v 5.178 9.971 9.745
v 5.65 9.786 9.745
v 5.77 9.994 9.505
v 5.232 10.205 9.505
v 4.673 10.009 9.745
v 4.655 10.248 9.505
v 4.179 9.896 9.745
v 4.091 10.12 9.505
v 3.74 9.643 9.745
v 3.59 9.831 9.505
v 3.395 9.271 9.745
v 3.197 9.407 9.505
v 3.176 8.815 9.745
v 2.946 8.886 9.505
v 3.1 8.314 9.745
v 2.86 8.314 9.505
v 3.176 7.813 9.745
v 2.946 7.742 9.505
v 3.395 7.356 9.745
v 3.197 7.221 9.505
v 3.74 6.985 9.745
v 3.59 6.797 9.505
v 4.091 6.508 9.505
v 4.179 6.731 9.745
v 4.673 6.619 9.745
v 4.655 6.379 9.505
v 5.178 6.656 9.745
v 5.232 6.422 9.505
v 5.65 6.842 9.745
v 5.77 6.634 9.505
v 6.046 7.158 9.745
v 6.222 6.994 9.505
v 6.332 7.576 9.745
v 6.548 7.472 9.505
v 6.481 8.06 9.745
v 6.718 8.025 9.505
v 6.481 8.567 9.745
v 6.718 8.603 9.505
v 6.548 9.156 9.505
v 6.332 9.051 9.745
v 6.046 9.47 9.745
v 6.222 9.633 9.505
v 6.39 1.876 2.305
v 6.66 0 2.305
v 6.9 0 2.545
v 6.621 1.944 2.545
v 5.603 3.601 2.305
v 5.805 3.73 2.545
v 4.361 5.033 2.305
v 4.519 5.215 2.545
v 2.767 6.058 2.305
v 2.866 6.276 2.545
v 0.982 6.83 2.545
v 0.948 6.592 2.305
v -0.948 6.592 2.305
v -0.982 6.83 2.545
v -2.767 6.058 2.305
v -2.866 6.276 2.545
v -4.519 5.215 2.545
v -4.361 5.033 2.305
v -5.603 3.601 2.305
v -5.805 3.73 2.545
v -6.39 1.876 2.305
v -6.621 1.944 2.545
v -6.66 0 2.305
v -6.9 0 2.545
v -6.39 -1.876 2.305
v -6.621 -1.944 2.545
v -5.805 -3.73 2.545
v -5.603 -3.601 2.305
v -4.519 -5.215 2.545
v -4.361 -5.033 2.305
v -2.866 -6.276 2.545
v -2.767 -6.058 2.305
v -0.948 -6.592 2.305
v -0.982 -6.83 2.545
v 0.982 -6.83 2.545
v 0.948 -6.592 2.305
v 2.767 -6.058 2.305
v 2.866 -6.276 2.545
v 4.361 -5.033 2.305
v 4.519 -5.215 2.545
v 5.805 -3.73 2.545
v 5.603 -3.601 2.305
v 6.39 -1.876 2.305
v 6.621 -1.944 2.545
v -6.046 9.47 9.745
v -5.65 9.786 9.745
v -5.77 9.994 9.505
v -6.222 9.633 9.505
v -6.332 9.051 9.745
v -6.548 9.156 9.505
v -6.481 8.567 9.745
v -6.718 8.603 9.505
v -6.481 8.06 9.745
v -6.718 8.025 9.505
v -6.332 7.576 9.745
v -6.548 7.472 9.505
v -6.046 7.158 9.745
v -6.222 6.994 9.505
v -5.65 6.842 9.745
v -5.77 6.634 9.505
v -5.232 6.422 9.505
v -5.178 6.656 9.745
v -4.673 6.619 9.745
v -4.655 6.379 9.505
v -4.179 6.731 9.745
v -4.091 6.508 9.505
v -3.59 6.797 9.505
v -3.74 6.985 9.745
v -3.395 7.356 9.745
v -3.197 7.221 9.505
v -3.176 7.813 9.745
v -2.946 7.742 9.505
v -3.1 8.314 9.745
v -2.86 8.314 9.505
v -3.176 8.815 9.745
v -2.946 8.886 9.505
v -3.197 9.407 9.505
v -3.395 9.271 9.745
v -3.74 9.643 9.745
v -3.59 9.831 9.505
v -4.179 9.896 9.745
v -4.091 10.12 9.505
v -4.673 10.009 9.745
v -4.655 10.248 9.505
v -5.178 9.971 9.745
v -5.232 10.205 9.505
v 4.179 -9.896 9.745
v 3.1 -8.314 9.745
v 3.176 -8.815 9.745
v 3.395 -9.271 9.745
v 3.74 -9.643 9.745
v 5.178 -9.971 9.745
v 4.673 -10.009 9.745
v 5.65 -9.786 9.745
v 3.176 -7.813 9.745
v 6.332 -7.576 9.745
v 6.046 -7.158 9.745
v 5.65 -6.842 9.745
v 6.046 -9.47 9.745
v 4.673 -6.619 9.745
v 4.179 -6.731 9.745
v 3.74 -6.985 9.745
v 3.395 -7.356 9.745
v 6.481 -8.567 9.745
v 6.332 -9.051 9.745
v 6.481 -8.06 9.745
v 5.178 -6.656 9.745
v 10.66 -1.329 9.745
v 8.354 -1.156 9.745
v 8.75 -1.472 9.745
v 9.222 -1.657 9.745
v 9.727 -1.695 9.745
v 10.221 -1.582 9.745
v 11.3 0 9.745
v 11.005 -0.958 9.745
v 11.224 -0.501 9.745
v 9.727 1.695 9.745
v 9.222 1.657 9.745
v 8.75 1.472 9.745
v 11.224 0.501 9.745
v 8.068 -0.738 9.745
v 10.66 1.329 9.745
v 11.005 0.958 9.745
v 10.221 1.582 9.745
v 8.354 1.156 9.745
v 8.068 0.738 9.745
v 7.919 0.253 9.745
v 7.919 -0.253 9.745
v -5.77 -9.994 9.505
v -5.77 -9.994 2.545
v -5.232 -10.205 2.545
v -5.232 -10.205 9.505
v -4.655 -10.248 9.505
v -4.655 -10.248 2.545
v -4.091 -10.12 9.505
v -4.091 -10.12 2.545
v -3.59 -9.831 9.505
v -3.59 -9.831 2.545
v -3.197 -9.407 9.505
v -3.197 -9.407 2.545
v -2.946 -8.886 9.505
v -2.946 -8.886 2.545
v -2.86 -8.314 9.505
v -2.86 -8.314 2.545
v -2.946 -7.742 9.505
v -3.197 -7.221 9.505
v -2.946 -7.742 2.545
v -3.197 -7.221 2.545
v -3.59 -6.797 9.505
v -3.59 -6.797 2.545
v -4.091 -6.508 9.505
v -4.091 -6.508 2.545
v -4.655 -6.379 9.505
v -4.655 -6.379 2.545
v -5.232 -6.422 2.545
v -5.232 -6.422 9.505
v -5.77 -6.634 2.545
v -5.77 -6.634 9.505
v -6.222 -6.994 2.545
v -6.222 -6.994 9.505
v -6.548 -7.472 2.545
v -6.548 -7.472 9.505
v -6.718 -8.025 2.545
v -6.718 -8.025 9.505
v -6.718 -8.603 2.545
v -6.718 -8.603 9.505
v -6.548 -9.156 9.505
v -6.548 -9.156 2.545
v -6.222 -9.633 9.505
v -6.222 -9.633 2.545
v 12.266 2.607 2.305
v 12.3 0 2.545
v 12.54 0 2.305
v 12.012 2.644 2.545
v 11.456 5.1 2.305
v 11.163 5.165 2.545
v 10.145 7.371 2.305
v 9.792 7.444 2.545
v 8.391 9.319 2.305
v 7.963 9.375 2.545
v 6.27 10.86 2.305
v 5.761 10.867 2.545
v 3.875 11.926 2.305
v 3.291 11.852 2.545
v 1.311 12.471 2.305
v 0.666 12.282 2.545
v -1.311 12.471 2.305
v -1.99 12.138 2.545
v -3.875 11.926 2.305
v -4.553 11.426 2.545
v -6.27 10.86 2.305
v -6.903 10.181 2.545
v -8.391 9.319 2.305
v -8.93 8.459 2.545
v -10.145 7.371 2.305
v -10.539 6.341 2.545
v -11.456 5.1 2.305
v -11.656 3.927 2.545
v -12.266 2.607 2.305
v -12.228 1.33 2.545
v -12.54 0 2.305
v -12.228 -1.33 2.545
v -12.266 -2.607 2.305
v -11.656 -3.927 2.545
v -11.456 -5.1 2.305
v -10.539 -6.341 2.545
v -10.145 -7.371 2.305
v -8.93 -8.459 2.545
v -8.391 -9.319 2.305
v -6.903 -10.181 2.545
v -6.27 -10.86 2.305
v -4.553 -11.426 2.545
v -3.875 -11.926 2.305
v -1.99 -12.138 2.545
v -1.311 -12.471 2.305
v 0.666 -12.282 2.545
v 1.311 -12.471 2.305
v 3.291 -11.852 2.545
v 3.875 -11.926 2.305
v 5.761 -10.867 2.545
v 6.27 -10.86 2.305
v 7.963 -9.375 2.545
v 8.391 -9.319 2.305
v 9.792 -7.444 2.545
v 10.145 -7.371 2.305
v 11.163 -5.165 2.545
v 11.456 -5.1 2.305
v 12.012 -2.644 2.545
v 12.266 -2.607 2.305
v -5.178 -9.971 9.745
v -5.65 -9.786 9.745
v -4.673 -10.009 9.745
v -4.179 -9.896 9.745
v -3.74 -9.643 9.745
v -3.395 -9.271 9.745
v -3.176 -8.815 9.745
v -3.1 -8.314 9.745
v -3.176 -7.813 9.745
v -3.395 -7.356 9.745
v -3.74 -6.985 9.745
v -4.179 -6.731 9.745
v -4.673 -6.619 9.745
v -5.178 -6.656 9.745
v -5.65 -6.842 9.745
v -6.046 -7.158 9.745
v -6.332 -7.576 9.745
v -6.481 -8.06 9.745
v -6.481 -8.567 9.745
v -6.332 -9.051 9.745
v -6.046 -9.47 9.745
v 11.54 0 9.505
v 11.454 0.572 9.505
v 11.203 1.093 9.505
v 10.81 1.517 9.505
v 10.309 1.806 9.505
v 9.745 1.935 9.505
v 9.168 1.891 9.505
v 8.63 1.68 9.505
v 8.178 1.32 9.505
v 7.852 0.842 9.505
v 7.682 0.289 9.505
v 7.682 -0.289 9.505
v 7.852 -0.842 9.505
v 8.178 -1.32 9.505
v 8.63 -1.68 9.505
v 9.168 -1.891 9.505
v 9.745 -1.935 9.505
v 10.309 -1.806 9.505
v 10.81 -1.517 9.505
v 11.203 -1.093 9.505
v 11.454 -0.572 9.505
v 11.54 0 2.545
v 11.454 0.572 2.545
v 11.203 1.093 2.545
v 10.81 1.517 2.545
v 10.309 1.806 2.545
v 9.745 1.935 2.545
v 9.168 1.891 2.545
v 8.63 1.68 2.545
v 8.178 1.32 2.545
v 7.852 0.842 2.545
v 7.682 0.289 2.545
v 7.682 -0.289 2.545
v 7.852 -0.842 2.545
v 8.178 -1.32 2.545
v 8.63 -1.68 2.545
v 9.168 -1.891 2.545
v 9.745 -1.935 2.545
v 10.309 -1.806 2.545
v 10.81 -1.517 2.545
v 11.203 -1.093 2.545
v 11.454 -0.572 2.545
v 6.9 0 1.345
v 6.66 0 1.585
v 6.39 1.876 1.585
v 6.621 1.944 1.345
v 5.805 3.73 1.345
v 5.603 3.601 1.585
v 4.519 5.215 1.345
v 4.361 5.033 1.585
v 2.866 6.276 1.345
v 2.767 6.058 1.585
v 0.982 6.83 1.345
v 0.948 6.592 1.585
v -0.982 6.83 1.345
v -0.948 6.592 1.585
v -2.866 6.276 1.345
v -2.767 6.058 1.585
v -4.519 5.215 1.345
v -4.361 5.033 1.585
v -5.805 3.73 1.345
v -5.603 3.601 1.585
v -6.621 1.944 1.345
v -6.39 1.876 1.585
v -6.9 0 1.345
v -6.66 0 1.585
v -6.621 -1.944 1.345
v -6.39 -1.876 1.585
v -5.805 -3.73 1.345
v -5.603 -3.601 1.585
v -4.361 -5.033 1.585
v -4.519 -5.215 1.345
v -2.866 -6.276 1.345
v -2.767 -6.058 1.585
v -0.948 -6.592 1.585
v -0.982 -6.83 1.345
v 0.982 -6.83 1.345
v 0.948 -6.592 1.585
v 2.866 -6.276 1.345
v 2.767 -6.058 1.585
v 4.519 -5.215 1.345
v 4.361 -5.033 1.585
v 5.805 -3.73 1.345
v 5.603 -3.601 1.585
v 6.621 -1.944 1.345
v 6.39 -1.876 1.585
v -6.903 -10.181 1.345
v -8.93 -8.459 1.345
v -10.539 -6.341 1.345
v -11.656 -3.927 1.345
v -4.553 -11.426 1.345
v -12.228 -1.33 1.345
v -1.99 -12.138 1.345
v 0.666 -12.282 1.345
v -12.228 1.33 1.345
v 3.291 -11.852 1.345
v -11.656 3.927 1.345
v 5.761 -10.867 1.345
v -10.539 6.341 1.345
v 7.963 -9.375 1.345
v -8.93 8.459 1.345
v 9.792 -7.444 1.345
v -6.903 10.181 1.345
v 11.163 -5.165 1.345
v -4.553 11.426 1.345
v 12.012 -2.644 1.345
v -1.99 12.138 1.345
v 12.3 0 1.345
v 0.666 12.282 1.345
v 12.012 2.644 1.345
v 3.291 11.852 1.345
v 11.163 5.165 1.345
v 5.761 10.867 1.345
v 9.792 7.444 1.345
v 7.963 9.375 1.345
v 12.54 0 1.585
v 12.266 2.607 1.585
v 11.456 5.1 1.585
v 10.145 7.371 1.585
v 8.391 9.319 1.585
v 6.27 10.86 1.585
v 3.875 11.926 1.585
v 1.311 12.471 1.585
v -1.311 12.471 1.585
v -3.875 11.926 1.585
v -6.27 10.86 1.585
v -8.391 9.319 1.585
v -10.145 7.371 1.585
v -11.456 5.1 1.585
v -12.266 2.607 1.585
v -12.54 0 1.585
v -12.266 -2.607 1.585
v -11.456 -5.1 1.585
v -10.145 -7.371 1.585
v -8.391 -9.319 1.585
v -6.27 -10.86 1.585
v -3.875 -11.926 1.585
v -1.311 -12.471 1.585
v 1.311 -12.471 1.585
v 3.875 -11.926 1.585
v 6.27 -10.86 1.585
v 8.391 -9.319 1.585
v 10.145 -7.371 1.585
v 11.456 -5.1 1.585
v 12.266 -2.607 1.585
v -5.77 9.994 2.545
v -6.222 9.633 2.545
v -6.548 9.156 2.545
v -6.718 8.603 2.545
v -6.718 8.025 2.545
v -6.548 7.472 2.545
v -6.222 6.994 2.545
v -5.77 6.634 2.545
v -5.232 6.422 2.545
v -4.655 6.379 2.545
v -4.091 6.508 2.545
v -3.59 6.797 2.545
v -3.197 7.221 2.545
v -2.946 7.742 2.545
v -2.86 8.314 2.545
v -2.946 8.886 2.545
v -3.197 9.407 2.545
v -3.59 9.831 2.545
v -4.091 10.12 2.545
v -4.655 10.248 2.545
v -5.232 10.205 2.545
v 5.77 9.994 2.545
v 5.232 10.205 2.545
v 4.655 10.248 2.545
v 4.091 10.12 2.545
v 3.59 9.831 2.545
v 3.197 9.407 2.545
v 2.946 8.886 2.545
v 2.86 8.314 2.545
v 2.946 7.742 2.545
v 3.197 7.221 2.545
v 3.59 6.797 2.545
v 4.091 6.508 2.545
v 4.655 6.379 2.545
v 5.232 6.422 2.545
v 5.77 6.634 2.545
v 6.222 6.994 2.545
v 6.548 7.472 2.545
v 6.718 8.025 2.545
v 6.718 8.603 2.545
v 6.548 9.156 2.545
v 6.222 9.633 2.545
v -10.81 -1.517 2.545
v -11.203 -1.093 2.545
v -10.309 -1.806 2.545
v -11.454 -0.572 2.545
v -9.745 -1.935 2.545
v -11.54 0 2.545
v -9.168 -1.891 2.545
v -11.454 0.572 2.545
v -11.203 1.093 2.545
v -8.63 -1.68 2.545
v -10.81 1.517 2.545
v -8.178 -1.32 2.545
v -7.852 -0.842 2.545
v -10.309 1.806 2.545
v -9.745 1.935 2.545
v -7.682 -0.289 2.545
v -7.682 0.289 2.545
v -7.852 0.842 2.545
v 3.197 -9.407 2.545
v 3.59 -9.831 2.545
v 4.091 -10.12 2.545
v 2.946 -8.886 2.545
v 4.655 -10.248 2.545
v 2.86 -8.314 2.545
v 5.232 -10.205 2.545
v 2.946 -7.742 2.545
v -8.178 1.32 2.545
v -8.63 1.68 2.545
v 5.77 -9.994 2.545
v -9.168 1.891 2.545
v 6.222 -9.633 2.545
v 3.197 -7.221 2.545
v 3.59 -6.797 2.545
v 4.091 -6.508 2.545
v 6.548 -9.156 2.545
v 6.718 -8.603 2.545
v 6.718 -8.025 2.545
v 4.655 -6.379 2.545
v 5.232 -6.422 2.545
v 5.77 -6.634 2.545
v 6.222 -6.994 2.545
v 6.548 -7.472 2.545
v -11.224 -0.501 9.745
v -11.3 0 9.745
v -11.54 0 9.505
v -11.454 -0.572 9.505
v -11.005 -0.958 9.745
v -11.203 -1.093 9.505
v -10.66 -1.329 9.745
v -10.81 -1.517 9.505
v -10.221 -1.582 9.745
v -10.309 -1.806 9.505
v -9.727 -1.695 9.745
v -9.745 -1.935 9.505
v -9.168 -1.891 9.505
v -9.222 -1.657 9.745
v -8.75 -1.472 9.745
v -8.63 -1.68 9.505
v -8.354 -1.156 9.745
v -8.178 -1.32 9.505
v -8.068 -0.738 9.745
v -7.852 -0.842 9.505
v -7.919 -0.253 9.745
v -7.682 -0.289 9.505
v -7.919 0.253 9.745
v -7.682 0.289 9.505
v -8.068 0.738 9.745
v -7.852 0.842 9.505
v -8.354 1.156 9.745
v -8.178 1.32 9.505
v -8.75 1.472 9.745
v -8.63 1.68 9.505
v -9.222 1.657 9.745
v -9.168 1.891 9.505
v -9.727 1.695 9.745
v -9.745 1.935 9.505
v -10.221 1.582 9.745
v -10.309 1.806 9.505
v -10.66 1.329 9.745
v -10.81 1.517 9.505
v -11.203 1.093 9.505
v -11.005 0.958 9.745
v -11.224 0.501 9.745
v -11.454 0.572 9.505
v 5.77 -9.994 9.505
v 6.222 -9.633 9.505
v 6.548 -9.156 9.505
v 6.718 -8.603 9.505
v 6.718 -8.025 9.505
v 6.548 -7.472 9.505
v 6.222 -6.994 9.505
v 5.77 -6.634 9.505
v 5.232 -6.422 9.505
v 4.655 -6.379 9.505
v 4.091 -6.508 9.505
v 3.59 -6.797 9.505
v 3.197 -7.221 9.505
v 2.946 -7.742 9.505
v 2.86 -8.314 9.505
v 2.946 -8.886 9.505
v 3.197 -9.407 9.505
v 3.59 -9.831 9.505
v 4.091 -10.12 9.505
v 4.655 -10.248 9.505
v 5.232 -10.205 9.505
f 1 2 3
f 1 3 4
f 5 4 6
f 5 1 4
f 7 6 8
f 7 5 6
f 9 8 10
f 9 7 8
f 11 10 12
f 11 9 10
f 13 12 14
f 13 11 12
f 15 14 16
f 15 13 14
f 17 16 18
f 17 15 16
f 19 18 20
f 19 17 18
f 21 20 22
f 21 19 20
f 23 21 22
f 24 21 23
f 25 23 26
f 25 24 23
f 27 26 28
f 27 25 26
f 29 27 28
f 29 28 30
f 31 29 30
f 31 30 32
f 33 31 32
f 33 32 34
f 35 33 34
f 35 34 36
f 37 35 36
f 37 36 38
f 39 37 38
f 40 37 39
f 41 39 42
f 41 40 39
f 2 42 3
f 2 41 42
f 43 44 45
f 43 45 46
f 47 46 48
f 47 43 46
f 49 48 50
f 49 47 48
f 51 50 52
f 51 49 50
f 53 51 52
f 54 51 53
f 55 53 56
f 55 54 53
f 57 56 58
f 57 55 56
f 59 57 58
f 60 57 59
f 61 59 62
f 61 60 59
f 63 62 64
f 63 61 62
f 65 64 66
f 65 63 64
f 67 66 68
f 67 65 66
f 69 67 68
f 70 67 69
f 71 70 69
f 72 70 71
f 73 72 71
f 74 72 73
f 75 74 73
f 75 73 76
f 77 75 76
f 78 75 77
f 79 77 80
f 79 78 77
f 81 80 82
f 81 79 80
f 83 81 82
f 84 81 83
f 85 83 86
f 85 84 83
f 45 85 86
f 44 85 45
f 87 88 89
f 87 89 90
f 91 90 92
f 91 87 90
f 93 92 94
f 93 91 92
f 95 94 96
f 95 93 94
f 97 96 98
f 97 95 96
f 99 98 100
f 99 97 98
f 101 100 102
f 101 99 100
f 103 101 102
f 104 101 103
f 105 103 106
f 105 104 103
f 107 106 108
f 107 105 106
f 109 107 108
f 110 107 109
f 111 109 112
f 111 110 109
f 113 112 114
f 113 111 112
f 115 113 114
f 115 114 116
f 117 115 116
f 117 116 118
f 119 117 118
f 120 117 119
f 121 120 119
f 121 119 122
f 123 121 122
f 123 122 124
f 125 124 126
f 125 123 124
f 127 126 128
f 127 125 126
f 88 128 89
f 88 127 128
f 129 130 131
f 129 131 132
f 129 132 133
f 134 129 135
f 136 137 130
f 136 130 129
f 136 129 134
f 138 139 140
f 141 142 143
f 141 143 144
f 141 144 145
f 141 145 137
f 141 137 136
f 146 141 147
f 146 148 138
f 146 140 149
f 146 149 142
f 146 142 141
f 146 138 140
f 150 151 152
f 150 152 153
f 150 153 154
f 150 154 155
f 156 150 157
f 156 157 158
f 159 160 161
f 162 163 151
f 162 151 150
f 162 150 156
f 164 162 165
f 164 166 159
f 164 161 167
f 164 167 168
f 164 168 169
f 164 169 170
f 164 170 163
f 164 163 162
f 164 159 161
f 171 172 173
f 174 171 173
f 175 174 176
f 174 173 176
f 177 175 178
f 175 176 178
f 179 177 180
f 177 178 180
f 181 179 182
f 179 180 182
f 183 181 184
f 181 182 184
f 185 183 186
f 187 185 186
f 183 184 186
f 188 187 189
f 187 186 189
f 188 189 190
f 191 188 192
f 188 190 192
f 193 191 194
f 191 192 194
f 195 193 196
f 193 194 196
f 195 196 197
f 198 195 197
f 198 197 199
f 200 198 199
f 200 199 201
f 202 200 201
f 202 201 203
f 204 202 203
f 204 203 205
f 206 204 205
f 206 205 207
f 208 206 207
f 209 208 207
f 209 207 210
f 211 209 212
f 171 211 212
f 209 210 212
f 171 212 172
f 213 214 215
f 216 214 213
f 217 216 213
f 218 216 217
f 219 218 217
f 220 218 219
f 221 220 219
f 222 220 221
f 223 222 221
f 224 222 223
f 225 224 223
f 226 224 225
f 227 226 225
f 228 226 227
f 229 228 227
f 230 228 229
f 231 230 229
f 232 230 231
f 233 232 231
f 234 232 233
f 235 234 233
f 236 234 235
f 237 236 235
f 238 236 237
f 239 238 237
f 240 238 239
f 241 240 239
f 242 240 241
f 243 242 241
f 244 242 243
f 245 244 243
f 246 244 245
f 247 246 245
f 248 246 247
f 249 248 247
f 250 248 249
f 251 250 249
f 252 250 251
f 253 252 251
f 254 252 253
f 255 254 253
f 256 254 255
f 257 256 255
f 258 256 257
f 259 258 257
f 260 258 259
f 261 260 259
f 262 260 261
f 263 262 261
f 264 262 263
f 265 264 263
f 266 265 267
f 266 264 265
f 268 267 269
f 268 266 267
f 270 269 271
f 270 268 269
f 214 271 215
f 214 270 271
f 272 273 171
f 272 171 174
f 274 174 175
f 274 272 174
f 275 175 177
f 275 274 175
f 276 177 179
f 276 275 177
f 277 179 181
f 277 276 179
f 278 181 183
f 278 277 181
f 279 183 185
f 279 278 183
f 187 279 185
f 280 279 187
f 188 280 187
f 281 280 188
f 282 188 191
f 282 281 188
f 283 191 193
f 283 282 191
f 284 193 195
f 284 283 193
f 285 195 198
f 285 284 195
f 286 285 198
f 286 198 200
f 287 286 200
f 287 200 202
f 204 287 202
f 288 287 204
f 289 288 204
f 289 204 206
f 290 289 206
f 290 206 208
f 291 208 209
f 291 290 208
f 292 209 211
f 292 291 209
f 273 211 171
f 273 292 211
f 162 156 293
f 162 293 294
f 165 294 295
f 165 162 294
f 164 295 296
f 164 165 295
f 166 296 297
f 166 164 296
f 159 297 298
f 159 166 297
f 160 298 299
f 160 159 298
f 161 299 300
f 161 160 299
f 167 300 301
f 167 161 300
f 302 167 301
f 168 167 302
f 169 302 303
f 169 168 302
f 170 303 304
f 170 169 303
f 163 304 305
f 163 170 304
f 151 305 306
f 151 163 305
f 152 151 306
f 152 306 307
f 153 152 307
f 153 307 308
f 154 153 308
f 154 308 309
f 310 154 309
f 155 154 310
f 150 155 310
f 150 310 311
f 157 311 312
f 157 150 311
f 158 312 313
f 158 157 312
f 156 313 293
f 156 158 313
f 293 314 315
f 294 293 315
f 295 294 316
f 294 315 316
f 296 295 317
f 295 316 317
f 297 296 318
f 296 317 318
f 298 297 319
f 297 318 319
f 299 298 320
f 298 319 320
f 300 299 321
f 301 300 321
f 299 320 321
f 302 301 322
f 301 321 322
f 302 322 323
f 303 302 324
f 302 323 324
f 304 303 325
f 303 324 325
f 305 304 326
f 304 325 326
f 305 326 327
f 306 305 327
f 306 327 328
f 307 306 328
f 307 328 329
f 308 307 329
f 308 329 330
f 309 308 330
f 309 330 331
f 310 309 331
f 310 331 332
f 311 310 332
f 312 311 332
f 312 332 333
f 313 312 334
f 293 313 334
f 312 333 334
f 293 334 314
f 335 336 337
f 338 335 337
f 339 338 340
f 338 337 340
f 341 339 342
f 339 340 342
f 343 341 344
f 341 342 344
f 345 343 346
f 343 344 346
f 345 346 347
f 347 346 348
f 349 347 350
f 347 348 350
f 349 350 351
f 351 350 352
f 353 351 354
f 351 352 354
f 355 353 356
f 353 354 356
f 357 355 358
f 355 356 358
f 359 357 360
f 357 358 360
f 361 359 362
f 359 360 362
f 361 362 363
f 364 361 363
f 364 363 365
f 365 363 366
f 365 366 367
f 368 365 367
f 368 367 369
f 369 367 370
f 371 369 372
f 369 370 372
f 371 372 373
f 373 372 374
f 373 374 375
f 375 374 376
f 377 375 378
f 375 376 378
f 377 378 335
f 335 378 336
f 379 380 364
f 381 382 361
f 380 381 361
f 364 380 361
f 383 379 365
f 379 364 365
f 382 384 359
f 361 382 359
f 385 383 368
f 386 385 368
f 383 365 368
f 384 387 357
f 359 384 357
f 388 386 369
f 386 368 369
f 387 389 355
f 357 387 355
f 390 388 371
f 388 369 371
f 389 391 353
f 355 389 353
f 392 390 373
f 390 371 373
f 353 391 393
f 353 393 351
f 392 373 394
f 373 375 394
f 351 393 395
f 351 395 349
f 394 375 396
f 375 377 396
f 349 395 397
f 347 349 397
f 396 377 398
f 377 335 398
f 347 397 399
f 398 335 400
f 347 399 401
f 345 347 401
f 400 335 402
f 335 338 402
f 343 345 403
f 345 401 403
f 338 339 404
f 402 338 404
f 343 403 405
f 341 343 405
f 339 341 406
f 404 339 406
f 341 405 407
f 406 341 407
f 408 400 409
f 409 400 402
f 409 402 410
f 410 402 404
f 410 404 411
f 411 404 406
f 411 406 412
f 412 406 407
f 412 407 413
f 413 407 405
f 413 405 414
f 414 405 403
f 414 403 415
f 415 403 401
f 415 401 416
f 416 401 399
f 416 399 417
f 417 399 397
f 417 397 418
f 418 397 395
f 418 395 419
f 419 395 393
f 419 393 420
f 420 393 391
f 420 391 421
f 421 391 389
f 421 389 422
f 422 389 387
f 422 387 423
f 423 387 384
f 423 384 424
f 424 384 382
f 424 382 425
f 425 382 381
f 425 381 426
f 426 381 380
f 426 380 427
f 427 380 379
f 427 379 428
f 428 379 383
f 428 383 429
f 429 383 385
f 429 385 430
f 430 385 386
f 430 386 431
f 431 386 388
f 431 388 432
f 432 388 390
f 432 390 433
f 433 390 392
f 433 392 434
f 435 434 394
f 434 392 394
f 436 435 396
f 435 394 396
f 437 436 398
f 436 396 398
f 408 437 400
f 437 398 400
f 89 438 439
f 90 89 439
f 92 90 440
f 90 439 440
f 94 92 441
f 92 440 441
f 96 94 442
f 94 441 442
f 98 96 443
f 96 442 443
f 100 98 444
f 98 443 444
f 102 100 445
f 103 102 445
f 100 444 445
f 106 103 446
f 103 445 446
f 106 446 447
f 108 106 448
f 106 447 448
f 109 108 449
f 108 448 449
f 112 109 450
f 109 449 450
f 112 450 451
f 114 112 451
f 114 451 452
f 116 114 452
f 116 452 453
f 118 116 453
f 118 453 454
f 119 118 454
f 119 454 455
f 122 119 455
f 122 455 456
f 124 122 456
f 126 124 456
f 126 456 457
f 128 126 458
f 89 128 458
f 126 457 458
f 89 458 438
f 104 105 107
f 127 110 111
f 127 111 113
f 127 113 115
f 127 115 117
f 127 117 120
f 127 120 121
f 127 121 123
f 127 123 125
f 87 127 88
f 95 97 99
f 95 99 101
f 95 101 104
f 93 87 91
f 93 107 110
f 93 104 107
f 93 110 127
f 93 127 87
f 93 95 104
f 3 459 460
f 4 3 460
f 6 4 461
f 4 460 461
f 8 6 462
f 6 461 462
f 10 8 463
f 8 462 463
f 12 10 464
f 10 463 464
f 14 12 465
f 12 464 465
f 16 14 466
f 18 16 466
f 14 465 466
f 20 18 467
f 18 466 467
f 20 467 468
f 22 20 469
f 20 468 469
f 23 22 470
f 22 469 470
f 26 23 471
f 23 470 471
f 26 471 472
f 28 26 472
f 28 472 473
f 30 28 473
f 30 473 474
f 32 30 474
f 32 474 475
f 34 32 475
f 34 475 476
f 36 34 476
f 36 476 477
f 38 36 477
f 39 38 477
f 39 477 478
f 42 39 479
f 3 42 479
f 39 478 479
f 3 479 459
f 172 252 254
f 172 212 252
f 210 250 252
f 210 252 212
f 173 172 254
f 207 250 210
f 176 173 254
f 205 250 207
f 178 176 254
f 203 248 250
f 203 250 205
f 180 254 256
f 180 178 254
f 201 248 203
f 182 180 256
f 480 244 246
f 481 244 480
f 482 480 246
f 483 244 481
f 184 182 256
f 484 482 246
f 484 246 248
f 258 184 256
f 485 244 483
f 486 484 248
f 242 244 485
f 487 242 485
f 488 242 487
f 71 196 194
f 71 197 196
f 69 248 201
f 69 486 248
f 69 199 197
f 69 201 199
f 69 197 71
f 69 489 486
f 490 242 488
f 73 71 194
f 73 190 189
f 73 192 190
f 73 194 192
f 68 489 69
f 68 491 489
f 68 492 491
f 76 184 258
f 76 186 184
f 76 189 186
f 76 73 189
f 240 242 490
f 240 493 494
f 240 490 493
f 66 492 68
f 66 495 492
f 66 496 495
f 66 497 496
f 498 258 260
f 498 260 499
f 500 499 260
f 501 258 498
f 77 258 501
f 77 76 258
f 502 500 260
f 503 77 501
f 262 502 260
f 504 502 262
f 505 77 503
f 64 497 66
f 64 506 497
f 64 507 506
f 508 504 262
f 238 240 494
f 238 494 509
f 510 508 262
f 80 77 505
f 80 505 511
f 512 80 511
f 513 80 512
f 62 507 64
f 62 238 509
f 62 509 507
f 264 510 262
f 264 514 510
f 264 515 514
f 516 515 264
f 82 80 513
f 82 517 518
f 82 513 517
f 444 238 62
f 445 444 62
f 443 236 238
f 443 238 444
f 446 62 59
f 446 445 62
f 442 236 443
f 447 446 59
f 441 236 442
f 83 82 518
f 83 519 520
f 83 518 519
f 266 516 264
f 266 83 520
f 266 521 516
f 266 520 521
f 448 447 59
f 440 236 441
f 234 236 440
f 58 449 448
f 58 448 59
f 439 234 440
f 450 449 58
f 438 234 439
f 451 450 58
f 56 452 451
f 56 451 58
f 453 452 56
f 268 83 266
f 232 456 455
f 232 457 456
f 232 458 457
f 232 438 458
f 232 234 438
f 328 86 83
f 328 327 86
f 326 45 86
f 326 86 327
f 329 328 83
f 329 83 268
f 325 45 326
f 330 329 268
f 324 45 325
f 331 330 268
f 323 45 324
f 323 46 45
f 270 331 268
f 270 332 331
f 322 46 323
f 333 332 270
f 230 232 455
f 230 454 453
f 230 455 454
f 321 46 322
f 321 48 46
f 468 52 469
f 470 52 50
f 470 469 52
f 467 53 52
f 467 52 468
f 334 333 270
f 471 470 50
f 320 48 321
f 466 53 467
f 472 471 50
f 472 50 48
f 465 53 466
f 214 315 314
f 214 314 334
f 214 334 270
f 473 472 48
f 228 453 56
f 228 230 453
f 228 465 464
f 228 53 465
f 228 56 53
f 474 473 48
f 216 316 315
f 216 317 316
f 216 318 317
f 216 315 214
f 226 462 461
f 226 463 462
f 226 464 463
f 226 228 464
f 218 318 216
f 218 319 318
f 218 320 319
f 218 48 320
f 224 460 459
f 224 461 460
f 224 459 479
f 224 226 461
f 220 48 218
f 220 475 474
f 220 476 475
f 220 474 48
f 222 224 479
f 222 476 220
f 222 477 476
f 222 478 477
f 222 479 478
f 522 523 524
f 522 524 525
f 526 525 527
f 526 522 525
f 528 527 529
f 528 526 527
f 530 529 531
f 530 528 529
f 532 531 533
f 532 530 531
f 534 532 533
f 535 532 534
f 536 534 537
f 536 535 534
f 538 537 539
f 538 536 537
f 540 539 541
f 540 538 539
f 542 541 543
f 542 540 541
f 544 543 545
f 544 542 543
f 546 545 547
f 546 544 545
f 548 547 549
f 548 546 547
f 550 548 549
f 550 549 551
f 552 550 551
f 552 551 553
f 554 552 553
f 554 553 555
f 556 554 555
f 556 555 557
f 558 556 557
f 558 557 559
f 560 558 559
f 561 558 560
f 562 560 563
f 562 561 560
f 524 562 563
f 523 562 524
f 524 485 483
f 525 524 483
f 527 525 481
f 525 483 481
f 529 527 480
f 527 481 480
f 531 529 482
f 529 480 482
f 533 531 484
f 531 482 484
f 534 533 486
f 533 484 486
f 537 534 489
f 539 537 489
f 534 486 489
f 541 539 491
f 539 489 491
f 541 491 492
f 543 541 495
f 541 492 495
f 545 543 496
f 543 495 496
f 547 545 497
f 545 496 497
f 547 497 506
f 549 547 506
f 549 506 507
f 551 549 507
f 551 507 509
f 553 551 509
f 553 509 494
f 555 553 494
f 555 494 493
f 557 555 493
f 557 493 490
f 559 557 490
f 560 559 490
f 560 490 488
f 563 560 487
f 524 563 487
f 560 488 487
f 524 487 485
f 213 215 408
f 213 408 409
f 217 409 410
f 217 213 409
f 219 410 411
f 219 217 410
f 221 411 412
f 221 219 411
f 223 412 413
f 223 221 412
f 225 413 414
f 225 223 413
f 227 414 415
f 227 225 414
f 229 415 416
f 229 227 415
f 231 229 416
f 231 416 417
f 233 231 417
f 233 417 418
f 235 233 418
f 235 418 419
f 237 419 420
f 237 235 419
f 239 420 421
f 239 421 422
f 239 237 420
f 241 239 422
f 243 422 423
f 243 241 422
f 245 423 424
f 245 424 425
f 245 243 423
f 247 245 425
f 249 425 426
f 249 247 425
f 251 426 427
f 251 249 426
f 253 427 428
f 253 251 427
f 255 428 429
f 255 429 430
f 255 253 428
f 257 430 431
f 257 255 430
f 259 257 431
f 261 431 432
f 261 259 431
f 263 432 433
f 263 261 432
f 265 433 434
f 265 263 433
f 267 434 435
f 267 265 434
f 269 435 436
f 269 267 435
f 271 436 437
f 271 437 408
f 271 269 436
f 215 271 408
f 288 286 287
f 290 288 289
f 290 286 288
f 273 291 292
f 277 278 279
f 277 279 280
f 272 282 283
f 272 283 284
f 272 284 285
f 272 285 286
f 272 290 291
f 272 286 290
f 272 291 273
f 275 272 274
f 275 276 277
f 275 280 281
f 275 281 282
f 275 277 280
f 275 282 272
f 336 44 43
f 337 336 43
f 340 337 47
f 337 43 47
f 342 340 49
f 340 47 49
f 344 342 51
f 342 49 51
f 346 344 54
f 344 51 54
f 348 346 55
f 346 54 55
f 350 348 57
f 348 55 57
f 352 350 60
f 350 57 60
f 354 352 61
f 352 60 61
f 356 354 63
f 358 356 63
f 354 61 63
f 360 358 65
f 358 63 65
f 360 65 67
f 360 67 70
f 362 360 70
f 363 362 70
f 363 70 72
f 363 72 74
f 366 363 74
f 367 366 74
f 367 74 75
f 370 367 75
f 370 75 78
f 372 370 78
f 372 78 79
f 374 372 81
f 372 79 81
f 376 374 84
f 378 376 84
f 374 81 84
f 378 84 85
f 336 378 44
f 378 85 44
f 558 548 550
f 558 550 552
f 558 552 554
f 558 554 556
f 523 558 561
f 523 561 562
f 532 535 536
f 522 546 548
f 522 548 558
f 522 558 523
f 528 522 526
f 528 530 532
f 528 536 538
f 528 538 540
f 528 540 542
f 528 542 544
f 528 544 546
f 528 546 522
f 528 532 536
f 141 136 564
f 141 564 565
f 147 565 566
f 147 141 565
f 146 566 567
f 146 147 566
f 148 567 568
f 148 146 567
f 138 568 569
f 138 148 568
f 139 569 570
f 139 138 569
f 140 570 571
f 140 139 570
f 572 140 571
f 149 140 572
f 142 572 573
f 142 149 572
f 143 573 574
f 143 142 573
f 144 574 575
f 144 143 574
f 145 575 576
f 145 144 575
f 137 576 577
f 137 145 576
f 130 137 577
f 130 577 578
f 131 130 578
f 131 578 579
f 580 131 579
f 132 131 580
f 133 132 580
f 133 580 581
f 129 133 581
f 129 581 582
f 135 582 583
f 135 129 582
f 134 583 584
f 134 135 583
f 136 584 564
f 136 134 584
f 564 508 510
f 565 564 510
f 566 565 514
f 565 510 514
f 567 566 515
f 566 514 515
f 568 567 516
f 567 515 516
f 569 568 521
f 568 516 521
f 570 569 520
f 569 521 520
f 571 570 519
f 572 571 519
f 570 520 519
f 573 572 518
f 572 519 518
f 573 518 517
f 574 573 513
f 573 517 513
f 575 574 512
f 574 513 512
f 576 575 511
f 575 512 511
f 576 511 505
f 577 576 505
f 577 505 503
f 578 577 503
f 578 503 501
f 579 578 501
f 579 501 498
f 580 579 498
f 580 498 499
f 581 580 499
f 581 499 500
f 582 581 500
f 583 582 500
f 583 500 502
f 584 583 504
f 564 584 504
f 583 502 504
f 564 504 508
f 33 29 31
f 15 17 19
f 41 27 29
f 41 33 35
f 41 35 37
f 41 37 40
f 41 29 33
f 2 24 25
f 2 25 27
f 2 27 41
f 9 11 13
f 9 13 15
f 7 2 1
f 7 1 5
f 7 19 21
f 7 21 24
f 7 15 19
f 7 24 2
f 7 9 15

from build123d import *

# Parameters (mm, degrees)
SKETCH1_R           = 31.35
SKETCH1_R_2         = 16.65
BOSS_EXTRUDE1_DEPTH = 3
SKETCH2_R           = 4.85
BOSS_EXTRUDE2_DEPTH = 18
CIRPATTERN1_COUNT   = 6
CHAMFER1_SIZE       = 0.6
SCALE1_SCALE        = 0.4


with BuildPart() as part:
    # Sketch1 → Boss-Extrude1 (new body)
    with BuildSketch(Plane.XY):
        Circle(SKETCH1_R)
        Circle(SKETCH1_R_2, mode=Mode.SUBTRACT)
    extrude(amount=-BOSS_EXTRUDE1_DEPTH)

    # Sketch2 → Boss-Extrude2 (add)
    with BuildSketch(Plane.XY):
        with Locations((24, 0)):
            Circle(SKETCH2_R)
    boss_extrude2 = extrude(amount=BOSS_EXTRUDE2_DEPTH)

    # CirPattern1: Boss-Extrude2 ×6 about axis
    cirpattern1_axis = Axis((0, 0, 0), (0, 0, 1))
    for i in range(1, CIRPATTERN1_COUNT):
        add(boss_extrude2.rotate(cirpattern1_axis, i * 360 / CIRPATTERN1_COUNT))

    # Chamfer1
    chamfer1_edges = [part.edges().sort_by_distance(p)[0] for p in [
        (19.15, 0, 18),
        (9.575, -16.584386482, 18),
        (-9.575, -16.584386482, 18),
        (-31.35, 0, 0),
        (-19.15, 0, 18),
        (-9.575, 16.584386482, 18),
        (9.575, 16.584386482, 18),
        (-31.35, 0, -3),
        (-16.65, 0, -3),
        (-16.65, 0, 0),
    ]]
    chamfer(chamfer1_edges, length=CHAMFER1_SIZE)


with BuildPart() as part_1:
    # Scale1: scaled about (0, 0, 4.240913614)
    add(part.part.scale(SCALE1_SCALE).moved(Location((0, 0, 2.544548168))))


solid = part_1.part
